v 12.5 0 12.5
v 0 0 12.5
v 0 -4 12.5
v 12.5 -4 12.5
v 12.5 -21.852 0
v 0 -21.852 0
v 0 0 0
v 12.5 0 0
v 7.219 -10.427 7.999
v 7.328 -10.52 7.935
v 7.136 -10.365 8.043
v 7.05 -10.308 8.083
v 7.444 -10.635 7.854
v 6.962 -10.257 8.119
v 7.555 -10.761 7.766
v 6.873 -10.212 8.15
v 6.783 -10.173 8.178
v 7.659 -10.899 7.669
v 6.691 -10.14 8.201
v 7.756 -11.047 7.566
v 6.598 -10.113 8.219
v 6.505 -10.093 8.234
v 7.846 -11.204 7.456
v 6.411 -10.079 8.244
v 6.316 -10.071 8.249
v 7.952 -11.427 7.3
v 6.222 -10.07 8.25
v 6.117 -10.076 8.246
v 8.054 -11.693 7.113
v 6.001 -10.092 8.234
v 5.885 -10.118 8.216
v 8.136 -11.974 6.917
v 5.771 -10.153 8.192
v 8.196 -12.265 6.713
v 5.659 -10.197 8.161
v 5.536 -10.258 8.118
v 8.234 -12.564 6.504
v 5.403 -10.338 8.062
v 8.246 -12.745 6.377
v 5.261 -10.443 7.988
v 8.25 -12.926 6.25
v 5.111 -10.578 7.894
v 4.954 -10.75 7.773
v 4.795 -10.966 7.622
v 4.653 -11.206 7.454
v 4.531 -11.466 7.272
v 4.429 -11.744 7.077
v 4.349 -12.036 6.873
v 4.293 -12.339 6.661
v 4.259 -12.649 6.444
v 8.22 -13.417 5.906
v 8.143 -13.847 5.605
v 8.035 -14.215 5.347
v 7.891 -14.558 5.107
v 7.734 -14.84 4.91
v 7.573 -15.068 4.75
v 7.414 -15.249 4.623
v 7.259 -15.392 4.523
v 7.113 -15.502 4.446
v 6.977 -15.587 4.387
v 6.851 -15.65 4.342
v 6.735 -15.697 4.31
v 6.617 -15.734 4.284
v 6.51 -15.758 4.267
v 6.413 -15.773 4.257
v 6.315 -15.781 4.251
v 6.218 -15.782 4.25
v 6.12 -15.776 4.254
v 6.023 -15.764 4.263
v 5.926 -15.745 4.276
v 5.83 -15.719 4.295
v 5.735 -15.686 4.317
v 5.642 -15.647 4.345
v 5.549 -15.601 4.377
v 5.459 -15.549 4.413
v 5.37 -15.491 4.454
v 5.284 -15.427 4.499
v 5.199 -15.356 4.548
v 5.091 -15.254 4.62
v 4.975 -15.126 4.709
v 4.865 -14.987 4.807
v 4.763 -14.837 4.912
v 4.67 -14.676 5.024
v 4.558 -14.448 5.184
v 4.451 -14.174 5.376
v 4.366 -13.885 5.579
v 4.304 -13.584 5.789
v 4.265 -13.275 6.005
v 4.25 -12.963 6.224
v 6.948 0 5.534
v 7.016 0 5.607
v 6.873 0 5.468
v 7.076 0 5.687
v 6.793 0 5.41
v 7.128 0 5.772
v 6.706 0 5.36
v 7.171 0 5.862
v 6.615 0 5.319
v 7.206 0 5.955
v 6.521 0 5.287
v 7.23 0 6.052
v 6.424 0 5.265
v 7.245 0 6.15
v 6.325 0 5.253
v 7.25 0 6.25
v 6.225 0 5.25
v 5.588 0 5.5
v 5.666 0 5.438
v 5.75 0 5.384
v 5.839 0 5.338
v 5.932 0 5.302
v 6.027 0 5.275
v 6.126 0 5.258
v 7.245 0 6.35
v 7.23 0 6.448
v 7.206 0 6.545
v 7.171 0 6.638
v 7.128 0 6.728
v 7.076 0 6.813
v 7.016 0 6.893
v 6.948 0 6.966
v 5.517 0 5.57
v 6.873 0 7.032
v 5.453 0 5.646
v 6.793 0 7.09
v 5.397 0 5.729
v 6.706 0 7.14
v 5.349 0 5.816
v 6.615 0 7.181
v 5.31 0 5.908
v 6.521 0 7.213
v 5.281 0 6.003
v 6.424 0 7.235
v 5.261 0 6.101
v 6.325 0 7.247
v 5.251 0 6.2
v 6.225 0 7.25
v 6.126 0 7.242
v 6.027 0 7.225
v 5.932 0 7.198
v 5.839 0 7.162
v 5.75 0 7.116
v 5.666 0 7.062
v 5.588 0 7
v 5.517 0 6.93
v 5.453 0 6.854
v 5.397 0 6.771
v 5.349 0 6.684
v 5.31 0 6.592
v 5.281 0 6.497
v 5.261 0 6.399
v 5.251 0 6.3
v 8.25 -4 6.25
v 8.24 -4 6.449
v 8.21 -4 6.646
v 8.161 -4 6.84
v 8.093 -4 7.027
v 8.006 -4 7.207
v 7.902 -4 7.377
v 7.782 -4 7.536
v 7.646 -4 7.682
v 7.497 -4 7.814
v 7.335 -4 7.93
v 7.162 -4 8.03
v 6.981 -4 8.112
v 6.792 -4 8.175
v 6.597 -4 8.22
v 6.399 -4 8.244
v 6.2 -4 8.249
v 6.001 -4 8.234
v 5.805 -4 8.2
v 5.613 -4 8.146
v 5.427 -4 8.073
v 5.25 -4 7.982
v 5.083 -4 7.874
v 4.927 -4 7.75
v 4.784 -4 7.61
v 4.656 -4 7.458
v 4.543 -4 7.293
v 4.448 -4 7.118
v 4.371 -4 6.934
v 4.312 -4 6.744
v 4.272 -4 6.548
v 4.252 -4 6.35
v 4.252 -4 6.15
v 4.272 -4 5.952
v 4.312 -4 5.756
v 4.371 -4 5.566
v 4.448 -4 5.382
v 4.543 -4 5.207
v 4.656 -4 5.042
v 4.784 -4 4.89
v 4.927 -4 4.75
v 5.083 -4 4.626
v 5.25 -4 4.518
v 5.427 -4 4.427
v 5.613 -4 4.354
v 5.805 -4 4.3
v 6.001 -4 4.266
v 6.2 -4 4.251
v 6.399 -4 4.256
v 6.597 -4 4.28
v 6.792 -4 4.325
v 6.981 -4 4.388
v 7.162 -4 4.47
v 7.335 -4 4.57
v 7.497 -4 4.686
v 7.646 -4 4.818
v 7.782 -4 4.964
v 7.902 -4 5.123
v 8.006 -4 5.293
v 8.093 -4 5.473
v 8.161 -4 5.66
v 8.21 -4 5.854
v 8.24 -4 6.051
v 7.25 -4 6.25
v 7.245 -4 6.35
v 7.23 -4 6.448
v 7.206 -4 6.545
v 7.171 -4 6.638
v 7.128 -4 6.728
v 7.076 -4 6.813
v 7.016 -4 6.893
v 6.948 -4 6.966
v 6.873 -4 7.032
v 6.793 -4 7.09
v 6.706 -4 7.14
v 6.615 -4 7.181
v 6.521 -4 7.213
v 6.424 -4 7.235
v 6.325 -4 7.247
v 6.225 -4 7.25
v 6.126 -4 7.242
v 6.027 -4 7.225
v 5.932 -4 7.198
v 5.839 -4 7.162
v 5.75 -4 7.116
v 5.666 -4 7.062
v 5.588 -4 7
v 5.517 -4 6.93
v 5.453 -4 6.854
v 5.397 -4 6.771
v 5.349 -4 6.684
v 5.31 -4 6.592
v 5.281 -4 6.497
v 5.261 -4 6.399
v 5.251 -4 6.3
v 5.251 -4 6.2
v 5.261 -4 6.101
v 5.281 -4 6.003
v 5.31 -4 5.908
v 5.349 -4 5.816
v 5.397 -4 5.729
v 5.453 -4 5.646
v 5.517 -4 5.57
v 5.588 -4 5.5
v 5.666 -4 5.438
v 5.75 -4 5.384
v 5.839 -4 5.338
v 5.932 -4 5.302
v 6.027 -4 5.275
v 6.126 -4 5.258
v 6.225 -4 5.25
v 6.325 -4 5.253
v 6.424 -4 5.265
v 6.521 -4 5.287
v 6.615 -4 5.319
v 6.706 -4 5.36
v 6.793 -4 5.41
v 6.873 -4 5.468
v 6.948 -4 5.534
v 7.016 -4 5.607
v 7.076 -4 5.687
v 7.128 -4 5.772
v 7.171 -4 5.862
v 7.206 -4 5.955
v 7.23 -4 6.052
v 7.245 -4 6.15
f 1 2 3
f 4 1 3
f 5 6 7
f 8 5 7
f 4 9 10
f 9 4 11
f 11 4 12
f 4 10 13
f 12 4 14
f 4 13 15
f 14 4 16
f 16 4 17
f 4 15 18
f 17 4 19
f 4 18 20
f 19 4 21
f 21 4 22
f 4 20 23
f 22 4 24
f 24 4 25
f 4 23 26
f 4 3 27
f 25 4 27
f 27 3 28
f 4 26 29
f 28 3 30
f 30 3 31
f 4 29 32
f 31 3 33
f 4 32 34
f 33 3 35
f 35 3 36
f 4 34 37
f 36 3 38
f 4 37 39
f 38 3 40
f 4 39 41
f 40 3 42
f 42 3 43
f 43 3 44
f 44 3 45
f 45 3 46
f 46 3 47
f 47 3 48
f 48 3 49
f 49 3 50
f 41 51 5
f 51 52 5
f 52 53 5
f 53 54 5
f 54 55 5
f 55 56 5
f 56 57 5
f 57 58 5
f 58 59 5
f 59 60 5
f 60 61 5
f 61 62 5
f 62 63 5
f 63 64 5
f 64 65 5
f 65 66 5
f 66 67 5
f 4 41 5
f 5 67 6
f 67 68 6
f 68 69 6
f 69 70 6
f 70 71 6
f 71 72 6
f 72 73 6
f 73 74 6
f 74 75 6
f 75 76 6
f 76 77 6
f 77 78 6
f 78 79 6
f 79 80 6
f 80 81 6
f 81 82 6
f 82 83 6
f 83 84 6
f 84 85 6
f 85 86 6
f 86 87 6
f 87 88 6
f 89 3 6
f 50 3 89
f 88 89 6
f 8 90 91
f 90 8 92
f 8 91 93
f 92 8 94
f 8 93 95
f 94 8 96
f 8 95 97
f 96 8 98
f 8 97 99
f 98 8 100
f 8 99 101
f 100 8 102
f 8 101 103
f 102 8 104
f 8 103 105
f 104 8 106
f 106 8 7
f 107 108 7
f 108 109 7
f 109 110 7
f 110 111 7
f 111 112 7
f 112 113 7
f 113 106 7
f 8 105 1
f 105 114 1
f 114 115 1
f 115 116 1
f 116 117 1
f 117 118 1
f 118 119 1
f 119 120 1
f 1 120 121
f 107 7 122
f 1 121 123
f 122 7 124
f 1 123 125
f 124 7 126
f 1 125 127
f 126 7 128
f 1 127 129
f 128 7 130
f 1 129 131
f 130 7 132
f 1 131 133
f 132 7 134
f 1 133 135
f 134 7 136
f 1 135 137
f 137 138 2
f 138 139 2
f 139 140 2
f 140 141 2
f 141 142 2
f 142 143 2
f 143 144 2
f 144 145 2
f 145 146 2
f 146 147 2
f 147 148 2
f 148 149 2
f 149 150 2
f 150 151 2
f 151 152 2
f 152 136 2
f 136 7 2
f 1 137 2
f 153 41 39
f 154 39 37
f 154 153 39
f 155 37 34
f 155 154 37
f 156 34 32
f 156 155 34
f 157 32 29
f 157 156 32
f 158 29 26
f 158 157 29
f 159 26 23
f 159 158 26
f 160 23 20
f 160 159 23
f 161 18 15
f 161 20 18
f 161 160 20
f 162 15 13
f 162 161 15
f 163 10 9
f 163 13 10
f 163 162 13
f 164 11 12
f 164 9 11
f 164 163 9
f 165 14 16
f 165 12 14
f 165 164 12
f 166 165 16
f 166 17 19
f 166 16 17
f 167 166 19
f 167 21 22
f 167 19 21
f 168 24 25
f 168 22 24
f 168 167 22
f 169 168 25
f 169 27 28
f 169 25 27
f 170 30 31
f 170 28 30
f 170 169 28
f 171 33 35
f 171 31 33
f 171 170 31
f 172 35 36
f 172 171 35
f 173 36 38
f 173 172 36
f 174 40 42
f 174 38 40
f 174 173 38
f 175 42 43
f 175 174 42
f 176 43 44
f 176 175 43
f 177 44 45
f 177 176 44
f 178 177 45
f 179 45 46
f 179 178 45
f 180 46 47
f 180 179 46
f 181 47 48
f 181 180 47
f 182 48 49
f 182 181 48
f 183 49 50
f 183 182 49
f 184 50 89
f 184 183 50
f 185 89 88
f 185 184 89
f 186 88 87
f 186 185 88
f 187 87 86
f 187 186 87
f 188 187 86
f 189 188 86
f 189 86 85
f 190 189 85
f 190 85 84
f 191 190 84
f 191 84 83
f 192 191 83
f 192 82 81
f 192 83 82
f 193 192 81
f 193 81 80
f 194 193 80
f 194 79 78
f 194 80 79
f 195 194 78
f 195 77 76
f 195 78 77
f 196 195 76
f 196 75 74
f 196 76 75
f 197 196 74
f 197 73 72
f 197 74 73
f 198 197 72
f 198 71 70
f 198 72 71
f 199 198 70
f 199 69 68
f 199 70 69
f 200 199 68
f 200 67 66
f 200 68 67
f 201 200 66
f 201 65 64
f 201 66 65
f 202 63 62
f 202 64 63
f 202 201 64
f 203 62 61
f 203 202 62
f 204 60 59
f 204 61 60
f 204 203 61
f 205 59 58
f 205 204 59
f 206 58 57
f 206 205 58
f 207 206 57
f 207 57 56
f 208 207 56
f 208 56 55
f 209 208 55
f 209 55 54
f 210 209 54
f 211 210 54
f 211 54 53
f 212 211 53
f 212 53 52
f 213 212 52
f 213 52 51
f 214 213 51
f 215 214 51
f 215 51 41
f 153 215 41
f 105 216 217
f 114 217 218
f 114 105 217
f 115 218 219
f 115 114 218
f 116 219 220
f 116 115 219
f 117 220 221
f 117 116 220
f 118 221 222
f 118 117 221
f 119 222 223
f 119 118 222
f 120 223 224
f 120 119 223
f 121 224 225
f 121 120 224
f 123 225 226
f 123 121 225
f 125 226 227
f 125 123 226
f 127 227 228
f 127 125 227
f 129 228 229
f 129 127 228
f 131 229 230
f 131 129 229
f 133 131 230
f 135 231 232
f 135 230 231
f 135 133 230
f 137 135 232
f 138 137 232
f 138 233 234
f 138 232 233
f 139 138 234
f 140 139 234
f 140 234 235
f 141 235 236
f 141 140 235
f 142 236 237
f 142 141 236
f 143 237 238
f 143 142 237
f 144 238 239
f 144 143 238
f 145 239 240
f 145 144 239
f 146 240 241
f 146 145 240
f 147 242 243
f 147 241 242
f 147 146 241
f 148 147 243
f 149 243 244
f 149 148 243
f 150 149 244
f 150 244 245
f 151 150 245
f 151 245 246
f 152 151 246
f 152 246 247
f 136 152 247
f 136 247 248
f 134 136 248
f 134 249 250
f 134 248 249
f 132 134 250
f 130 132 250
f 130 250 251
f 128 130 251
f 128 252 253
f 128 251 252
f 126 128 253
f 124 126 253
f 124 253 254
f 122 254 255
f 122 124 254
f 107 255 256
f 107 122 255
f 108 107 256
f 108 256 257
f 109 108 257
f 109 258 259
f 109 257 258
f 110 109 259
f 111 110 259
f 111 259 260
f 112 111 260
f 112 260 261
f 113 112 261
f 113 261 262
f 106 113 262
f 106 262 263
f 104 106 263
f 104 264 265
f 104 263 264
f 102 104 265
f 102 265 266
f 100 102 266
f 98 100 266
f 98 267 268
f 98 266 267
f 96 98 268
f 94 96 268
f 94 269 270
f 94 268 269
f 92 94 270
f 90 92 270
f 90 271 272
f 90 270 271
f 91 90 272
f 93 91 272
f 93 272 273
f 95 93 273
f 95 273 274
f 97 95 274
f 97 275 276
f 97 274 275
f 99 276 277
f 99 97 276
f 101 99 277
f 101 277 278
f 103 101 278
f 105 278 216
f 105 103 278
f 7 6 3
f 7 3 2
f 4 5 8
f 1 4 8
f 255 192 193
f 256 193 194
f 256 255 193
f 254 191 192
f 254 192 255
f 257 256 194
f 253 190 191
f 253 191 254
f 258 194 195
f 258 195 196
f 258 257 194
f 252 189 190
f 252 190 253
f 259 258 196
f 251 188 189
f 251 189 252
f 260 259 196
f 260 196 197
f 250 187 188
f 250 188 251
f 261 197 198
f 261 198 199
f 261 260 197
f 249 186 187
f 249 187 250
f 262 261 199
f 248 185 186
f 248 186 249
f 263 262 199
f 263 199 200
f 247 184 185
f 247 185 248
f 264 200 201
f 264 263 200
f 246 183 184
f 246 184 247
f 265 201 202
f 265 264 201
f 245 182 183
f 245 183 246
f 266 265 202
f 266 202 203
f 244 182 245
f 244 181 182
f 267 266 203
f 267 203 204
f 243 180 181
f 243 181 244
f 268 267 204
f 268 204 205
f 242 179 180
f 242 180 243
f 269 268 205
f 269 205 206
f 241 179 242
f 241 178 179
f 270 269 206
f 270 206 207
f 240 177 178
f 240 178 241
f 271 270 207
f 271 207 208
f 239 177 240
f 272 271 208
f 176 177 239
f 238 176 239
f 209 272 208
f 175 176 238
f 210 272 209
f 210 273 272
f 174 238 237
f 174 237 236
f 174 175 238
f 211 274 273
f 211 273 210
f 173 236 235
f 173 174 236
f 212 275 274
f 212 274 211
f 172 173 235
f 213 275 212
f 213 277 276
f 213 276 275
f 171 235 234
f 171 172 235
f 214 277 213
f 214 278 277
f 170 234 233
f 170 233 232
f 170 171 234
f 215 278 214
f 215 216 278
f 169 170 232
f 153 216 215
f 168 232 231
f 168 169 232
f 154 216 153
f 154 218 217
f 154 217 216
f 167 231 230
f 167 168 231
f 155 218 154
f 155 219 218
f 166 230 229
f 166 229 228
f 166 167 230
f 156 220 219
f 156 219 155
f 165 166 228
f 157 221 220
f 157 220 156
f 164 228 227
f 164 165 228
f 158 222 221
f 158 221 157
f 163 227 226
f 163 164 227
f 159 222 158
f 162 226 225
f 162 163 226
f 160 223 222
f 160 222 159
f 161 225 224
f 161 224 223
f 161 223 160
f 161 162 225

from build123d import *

# Parameters (mm, degrees)
PAD006_DEPTH    = 12.5
SKETCH011_R     = 1
POCKET015_DEPTH = 50
SKETCH_R        = 2
POCKET_DEPTH    = 21.85185


with BuildPart() as part:
    # Sketch010 → Pad006 (new body)
    with BuildSketch(Plane.YZ):
        Polygon((-21.85185, 0), (0, 0), (0, 12.5), (-4, 12.5), align=None)
    extrude(amount=PAD006_DEPTH)

    # Sketch011 → Pocket015 (cut)
    with BuildSketch(Plane.XZ):
        with Locations((6.25, 6.25)):
            Circle(SKETCH011_R)
    extrude(amount=POCKET015_DEPTH, mode=Mode.SUBTRACT)

    # Sketch (on DatumPlane) → Pocket (cut)
    with BuildSketch(Plane.XZ.offset(4)):
        with Locations((6.25, 6.25)):
            Circle(SKETCH_R)
    extrude(amount=POCKET_DEPTH, mode=Mode.SUBTRACT)


solid = part.part
